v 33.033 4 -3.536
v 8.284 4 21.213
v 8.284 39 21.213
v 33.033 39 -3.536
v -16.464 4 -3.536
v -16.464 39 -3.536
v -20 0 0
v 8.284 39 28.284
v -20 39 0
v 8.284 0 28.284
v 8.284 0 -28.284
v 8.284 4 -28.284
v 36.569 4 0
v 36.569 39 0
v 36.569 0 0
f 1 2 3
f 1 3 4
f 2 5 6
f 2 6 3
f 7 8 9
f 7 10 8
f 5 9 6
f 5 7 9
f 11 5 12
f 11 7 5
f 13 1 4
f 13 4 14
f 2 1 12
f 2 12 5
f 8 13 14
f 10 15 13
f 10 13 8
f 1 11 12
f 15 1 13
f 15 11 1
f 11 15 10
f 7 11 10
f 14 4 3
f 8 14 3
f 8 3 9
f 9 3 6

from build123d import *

# Parameters (mm, degrees)
SALIENTE_EXTRUIR1_DEPTH = 4
SALIENTE_EXTRUIR2_DEPTH = 35


with BuildPart() as part:
    # Croquis1 → Saliente-Extruir1 (new body)
    with BuildSketch(Plane(origin=(0, 0, 0), x_dir=(1, 0, 0), z_dir=(0, 1, 0))):
        Polygon((8.284271247, 28.284271247), (36.568542495, 0), (8.284271247, -28.284271247), (-20, 0), align=None)
    extrude(amount=SALIENTE_EXTRUIR1_DEPTH)

    # Croquis2 → Saliente-Extruir2 (add)
    with BuildSketch(Plane(origin=(0, 4, 0), x_dir=(1, 0, 0), z_dir=(0, 1, 0))):
        Polygon((-20, 0), (-16.464466094, 3.535533906), (8.284271247, -21.213203436), (33.033008589, 3.535533906), (36.568542495, 0), (8.284271247, -28.284271247), align=None)
    extrude(amount=SALIENTE_EXTRUIR2_DEPTH)


solid = part.part
